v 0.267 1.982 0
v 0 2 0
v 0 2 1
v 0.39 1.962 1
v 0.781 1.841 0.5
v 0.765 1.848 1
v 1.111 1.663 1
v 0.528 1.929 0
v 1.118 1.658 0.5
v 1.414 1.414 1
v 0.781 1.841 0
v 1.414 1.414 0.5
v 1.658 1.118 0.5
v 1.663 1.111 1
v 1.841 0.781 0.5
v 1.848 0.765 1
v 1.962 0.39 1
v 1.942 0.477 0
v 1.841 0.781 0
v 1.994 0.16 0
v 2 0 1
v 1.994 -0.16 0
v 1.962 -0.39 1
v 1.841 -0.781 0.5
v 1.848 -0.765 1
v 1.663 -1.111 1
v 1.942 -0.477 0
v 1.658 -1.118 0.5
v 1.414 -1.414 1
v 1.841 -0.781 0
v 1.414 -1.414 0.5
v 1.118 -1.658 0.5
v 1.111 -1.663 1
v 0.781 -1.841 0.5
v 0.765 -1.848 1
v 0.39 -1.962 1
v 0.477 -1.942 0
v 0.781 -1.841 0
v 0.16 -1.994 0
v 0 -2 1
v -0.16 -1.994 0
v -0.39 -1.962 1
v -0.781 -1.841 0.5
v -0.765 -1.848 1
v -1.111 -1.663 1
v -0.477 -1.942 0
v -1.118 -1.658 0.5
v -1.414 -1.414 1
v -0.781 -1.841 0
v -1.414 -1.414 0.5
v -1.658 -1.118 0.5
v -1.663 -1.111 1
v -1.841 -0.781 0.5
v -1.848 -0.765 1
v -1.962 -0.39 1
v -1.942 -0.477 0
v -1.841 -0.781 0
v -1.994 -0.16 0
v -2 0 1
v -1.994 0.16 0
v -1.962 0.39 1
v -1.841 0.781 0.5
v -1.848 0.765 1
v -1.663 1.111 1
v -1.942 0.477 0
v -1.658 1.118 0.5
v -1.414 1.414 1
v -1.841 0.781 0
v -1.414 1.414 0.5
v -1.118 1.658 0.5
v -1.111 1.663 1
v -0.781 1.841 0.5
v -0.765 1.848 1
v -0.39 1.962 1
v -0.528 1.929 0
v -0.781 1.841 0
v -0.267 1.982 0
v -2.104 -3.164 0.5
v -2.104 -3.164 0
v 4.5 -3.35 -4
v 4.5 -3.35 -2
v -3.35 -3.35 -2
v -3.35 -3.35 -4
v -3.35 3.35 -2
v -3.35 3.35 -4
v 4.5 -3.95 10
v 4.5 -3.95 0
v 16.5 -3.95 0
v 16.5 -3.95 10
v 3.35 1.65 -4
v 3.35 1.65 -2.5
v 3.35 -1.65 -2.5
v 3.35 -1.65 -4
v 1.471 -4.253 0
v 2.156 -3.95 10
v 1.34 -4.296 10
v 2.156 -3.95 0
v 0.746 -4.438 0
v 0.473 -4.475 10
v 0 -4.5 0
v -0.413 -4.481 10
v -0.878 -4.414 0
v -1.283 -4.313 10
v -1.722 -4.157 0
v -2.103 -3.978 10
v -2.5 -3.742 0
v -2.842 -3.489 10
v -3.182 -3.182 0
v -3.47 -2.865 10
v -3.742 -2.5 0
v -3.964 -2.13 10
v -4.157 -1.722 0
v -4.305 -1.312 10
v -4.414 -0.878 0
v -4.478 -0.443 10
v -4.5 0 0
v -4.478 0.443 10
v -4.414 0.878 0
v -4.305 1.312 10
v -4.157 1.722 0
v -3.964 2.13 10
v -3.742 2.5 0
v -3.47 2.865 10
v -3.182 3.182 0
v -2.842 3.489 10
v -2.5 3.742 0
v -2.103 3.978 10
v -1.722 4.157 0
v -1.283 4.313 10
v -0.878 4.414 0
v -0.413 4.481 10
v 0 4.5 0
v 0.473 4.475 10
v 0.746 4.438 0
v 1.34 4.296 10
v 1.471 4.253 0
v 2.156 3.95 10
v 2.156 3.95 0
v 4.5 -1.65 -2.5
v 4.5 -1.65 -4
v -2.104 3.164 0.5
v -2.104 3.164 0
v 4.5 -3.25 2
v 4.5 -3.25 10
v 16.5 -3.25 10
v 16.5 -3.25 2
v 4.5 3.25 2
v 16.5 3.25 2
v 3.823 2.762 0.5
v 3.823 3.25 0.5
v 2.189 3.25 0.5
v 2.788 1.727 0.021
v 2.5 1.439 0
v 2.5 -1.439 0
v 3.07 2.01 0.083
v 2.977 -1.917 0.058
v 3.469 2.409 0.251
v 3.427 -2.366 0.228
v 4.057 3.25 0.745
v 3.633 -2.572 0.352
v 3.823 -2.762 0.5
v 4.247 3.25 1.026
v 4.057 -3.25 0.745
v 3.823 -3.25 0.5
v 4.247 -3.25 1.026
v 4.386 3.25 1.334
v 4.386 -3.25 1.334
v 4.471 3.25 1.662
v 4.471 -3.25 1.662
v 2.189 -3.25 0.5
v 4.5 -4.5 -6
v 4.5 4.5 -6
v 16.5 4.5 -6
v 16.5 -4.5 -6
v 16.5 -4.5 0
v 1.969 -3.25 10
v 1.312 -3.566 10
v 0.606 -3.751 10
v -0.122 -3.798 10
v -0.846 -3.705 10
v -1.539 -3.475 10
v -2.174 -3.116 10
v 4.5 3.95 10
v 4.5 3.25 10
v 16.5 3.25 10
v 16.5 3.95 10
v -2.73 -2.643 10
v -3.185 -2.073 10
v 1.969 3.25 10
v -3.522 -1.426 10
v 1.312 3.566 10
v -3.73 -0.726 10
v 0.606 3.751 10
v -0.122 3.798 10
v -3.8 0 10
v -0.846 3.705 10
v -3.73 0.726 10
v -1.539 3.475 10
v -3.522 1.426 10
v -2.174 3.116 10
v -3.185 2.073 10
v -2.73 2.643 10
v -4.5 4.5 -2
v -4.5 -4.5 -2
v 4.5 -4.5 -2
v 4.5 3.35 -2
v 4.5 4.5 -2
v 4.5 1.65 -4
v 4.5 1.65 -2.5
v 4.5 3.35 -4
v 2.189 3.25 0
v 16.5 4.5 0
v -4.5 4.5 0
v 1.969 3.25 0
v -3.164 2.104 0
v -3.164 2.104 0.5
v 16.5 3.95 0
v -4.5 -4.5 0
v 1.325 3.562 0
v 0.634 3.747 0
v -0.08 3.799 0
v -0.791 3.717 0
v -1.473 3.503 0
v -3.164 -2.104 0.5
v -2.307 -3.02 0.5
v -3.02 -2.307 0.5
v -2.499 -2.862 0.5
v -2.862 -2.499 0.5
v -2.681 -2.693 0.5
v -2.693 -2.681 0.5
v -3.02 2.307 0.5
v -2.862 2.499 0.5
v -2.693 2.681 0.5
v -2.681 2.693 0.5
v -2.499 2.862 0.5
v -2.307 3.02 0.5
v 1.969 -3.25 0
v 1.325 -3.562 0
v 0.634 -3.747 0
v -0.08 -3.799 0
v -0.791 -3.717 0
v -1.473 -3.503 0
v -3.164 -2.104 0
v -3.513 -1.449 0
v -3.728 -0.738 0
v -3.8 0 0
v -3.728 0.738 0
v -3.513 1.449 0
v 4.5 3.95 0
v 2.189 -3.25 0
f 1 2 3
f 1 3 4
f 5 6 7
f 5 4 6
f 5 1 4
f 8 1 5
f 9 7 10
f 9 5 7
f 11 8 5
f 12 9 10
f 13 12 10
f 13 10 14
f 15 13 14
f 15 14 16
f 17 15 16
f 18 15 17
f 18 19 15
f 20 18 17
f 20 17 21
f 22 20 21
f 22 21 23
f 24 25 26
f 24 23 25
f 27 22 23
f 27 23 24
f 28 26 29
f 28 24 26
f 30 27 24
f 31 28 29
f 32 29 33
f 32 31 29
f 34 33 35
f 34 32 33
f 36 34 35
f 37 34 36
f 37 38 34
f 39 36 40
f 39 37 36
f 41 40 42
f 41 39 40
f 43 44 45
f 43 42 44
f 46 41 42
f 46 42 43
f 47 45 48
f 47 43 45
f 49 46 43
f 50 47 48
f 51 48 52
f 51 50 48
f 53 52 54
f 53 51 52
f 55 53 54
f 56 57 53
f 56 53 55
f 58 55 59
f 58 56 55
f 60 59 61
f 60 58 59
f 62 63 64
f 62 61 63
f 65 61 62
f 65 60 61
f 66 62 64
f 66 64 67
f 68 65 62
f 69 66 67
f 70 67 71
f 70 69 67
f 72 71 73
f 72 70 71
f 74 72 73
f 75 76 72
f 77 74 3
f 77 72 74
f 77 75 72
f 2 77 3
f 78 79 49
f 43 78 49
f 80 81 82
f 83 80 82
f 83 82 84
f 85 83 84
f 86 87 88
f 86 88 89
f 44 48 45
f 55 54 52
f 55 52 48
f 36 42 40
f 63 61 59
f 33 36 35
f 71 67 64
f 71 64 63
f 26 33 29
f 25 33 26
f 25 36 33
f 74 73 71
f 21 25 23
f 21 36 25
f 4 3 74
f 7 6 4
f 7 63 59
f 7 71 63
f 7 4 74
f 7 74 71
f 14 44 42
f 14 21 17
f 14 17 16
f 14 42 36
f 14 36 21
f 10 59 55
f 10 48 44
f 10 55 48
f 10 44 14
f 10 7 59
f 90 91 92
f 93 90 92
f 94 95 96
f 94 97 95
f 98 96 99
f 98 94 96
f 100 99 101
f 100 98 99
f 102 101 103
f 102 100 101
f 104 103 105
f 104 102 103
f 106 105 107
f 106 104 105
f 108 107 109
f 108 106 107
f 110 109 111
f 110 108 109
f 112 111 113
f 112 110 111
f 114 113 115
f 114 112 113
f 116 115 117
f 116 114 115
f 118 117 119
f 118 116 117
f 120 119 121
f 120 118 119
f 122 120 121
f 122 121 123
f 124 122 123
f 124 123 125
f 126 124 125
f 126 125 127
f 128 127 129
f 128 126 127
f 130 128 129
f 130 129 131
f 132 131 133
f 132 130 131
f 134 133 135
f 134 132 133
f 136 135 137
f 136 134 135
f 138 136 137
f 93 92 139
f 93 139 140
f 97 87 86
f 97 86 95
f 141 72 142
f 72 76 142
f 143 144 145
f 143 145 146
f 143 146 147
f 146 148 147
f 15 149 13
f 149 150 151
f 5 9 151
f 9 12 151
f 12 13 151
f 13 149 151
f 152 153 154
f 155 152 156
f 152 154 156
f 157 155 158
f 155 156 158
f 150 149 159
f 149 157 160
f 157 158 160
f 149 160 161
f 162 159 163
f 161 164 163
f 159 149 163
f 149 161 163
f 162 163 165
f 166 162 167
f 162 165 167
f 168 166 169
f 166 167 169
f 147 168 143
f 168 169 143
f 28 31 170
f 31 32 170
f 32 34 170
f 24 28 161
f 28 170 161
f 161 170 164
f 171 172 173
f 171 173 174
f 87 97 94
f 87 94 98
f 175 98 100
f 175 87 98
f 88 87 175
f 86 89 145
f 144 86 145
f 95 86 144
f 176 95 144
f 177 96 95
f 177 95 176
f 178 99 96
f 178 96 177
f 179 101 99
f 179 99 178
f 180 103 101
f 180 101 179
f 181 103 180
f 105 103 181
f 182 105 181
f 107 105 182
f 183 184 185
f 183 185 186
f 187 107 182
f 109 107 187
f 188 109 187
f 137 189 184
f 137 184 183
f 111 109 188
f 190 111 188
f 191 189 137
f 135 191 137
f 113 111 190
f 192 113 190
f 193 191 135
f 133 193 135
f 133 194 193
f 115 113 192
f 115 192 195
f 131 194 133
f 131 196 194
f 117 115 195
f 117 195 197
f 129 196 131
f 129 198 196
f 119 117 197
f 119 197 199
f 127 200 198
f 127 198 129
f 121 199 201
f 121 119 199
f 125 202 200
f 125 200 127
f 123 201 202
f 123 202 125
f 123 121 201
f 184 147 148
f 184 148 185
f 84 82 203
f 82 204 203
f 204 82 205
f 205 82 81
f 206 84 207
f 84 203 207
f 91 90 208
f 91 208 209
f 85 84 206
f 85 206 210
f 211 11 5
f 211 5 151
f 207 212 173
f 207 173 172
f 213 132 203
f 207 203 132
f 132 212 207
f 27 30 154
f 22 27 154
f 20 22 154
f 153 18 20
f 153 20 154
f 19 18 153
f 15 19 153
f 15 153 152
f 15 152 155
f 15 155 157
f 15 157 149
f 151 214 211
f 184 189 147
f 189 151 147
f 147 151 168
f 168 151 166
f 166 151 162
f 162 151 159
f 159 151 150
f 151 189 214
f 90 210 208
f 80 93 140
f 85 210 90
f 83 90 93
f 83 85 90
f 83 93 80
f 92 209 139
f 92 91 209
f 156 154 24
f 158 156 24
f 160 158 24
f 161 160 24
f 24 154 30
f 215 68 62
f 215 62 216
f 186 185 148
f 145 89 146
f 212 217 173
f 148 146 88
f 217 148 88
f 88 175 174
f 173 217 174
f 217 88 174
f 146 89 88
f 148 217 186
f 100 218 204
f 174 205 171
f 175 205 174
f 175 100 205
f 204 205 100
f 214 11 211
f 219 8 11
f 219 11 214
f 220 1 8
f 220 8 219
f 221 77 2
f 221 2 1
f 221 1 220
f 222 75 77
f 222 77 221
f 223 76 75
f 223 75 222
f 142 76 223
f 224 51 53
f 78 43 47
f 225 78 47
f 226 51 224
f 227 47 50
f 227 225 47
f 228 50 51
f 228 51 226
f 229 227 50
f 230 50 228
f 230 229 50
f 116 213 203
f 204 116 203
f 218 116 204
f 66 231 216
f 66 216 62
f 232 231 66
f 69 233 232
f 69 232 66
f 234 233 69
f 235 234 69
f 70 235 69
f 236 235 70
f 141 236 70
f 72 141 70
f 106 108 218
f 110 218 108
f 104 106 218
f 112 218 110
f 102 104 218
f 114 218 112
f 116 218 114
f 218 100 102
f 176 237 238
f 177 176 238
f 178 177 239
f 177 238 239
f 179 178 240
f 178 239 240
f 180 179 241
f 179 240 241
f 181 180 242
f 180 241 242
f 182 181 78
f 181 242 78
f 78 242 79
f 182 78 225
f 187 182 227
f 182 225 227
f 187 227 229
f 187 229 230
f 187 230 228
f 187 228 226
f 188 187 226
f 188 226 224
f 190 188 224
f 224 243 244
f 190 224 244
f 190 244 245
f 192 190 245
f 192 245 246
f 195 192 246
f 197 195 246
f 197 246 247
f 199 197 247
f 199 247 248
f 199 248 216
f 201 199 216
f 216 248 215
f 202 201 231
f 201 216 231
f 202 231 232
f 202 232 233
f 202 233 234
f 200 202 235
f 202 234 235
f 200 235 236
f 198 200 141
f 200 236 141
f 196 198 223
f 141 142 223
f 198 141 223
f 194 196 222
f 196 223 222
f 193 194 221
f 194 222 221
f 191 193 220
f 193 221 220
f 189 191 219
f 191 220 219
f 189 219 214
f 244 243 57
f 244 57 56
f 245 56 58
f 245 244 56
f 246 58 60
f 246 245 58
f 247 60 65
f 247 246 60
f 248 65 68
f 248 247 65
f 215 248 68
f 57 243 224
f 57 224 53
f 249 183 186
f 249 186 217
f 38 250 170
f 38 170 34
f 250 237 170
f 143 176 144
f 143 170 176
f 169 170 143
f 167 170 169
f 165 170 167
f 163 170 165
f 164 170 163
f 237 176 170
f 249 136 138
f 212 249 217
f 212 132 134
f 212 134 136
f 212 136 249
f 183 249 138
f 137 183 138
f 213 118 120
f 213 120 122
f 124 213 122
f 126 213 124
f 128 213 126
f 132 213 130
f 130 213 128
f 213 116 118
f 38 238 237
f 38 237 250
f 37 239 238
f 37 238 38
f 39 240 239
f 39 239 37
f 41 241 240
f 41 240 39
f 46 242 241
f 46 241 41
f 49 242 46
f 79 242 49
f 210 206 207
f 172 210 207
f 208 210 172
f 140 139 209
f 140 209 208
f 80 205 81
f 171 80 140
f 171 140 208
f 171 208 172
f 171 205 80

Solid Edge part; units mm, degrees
sketch "Sketch1" plane through (0, 0, 0) normal (0, 0, 1) x (1, 0, 0)
  line L0 (-4.5, -4.5) -> (4.5, -4.5)
  line L1 (4.5, -4.5) -> (4.5, 4.5)
  line L2 (4.5, 4.5) -> (-4.5, 4.5)
  line L3 (-4.5, 4.5) -> (-4.5, -4.5)
extrude "Protrusion1" add sketch "Sketch1" against normal blind 2
sketch "Sketch2" plane through (0, 0, -2) normal (0, 0, -1) x (1, 0, 0)
  line L0 (3.35, 3.35) -> (-3.35, 3.35)
  line L1 (-3.35, 3.35) -> (-3.35, -3.35)
  line L2 (-3.35, -3.35) -> (3.35, -3.35)
  line L3 (3.35, -3.35) -> (3.35, 3.35)
extrude "ExtrudedProtrusion_2" add sketch "Sketch2" along normal blind 2
sketch "Sketch3" plane through (3.35, 0, -3.5) normal (1, 0, 0) x (0, 1, 0)
  line L0 (1.65, -0.5) -> (1.65, 1)
  line L1 (1.65, 1) -> (-1.65, 1)
  line L2 (-1.65, 1) -> (-1.65, -0.5)
  line L3 (-1.65, -0.5) -> (-3.35, -0.5)
  line L4 (-3.35, -0.5) -> (-3.35, 1.5)
  line L5 (-3.35, 1.5) -> (3.35, 1.5)
  line L6 (3.35, 1.5) -> (3.35, -0.5)
  line L7 (3.35, -0.5) -> (1.65, -0.5)
extrude "Protrusion2" add sketch "Sketch3" along normal up to surface (1.15 mm away)
sketch "Sketch4" plane through (0, 0, 0) normal (0, 0, 1) x (0, 1, 0)
  circle A0 centre (0, 0) radius 2
extrude "ExtrudedProtrusion_4" add sketch "Sketch4" along normal blind 1
sketch "Sketch5" plane through (0, 0, 0) normal (0, 0, 1) x (0, 1, 0)
  line L0 (3.25, -1.9691) -> (3.25, -4.5)
  line L1 (3.25, -4.5) -> (3.95, -4.5)
  line L2 (3.95, -4.5) -> (3.95, -2.1558)
  line L3 (-3.95, -4.5) -> (-3.95, -2.1558)
  line L4 (-3.25, -4.5) -> (-3.95, -4.5)
  line L5 (-3.25, -1.9691) -> (-3.25, -4.5)
  arc A0 (-3.25, -1.9691) -> (3.25, -1.9691) centre (0, 0) cw
  arc A1 (-3.95, -2.1558) -> (3.95, -2.1558) centre (0, 0) cw
extrude "Protrusion3" add sketch "Sketch5" along normal blind 10
sketch "Sketch6" plane through (4.5, 0, 0.5) normal (1, 0, 0) x (0, 1, 0)
  line L0 (4.5, -6.5) -> (-4.5, -6.5)
  line L1 (-4.5, -6.5) -> (-4.5, -0.5)
  line L2 (-4.5, -0.5) -> (-3.95, -0.5)
  line L3 (-3.95, -0.5) -> (-3.95, 9.5)
  line L4 (-3.95, 9.5) -> (-3.25, 9.5)
  line L5 (-3.25, 9.5) -> (-3.25, -0.5)
  line L6 (-3.25, -0.5) -> (3.25, -0.5)
  line L7 (3.25, -0.5) -> (3.25, 9.5)
  line L8 (3.25, 9.5) -> (3.95, 9.5)
  line L9 (3.95, 9.5) -> (3.95, -0.5)
  line L10 (3.95, -0.5) -> (4.5, -0.5)
  line L11 (4.5, -0.5) -> (4.5, -6.5)
extrude "ExtrudedProtrusion_8" add sketch "Sketch6" along normal blind 12
sketch "Sketch7" plane through (6.25, 0, 0) normal (0, 0, 1) x (1, 0, 0)
  line L0 (-1.75, -3.25) -> (-1.75, 3.25)
  line L1 (-1.75, 3.25) -> (10.25, 3.25)
  line L2 (10.25, 3.25) -> (10.25, -3.25)
  line L3 (10.25, -3.25) -> (-1.75, -3.25)
extrude "ExtrudedProtrusion_9" add sketch "Sketch7" along normal blind 2
sketch "Sketch8" plane through (0.25, 0, 0) normal (0, 0, 1) x (0, 1, 0)
  line L0 (1.8413, -0.5307) -> (3.45, -2.1393)
  line L1 (3.45, -2.1393) -> (3.45, -4.2607)
  line L2 (0.7807, -1.5913) -> (3.45, -4.2607)
  line L3 (1.8413, -0.5307) -> (0.7807, -1.5913)
  line L4 (1.8413, 1.0307) -> (3.2173, 2.4067)
  line L5 (2.1567, 3.4673) -> (3.2173, 2.4067)
  line L6 (0.7807, 2.0913) -> (2.1567, 3.4673)
  line L7 (0.7807, 2.0913) -> (1.8413, 1.0307)
  dimension "D1" = 0.75
  dimension "D2" = 0.75
  dimension "D3" = 0.75
  dimension "D4" = 0.75
  dimension "D5" = 0.2
extrude "ExtrudedProtrusion_6" add sketch "Sketch8" along normal blind 0.5
mirror "Mirror1" about plane through (0.25, 0, 0) normal (0, 1, 0) of "ExtrudedProtrusion_6"
fillet "Round_1" radius 2 1 edges at (4.5, 0, 0)
